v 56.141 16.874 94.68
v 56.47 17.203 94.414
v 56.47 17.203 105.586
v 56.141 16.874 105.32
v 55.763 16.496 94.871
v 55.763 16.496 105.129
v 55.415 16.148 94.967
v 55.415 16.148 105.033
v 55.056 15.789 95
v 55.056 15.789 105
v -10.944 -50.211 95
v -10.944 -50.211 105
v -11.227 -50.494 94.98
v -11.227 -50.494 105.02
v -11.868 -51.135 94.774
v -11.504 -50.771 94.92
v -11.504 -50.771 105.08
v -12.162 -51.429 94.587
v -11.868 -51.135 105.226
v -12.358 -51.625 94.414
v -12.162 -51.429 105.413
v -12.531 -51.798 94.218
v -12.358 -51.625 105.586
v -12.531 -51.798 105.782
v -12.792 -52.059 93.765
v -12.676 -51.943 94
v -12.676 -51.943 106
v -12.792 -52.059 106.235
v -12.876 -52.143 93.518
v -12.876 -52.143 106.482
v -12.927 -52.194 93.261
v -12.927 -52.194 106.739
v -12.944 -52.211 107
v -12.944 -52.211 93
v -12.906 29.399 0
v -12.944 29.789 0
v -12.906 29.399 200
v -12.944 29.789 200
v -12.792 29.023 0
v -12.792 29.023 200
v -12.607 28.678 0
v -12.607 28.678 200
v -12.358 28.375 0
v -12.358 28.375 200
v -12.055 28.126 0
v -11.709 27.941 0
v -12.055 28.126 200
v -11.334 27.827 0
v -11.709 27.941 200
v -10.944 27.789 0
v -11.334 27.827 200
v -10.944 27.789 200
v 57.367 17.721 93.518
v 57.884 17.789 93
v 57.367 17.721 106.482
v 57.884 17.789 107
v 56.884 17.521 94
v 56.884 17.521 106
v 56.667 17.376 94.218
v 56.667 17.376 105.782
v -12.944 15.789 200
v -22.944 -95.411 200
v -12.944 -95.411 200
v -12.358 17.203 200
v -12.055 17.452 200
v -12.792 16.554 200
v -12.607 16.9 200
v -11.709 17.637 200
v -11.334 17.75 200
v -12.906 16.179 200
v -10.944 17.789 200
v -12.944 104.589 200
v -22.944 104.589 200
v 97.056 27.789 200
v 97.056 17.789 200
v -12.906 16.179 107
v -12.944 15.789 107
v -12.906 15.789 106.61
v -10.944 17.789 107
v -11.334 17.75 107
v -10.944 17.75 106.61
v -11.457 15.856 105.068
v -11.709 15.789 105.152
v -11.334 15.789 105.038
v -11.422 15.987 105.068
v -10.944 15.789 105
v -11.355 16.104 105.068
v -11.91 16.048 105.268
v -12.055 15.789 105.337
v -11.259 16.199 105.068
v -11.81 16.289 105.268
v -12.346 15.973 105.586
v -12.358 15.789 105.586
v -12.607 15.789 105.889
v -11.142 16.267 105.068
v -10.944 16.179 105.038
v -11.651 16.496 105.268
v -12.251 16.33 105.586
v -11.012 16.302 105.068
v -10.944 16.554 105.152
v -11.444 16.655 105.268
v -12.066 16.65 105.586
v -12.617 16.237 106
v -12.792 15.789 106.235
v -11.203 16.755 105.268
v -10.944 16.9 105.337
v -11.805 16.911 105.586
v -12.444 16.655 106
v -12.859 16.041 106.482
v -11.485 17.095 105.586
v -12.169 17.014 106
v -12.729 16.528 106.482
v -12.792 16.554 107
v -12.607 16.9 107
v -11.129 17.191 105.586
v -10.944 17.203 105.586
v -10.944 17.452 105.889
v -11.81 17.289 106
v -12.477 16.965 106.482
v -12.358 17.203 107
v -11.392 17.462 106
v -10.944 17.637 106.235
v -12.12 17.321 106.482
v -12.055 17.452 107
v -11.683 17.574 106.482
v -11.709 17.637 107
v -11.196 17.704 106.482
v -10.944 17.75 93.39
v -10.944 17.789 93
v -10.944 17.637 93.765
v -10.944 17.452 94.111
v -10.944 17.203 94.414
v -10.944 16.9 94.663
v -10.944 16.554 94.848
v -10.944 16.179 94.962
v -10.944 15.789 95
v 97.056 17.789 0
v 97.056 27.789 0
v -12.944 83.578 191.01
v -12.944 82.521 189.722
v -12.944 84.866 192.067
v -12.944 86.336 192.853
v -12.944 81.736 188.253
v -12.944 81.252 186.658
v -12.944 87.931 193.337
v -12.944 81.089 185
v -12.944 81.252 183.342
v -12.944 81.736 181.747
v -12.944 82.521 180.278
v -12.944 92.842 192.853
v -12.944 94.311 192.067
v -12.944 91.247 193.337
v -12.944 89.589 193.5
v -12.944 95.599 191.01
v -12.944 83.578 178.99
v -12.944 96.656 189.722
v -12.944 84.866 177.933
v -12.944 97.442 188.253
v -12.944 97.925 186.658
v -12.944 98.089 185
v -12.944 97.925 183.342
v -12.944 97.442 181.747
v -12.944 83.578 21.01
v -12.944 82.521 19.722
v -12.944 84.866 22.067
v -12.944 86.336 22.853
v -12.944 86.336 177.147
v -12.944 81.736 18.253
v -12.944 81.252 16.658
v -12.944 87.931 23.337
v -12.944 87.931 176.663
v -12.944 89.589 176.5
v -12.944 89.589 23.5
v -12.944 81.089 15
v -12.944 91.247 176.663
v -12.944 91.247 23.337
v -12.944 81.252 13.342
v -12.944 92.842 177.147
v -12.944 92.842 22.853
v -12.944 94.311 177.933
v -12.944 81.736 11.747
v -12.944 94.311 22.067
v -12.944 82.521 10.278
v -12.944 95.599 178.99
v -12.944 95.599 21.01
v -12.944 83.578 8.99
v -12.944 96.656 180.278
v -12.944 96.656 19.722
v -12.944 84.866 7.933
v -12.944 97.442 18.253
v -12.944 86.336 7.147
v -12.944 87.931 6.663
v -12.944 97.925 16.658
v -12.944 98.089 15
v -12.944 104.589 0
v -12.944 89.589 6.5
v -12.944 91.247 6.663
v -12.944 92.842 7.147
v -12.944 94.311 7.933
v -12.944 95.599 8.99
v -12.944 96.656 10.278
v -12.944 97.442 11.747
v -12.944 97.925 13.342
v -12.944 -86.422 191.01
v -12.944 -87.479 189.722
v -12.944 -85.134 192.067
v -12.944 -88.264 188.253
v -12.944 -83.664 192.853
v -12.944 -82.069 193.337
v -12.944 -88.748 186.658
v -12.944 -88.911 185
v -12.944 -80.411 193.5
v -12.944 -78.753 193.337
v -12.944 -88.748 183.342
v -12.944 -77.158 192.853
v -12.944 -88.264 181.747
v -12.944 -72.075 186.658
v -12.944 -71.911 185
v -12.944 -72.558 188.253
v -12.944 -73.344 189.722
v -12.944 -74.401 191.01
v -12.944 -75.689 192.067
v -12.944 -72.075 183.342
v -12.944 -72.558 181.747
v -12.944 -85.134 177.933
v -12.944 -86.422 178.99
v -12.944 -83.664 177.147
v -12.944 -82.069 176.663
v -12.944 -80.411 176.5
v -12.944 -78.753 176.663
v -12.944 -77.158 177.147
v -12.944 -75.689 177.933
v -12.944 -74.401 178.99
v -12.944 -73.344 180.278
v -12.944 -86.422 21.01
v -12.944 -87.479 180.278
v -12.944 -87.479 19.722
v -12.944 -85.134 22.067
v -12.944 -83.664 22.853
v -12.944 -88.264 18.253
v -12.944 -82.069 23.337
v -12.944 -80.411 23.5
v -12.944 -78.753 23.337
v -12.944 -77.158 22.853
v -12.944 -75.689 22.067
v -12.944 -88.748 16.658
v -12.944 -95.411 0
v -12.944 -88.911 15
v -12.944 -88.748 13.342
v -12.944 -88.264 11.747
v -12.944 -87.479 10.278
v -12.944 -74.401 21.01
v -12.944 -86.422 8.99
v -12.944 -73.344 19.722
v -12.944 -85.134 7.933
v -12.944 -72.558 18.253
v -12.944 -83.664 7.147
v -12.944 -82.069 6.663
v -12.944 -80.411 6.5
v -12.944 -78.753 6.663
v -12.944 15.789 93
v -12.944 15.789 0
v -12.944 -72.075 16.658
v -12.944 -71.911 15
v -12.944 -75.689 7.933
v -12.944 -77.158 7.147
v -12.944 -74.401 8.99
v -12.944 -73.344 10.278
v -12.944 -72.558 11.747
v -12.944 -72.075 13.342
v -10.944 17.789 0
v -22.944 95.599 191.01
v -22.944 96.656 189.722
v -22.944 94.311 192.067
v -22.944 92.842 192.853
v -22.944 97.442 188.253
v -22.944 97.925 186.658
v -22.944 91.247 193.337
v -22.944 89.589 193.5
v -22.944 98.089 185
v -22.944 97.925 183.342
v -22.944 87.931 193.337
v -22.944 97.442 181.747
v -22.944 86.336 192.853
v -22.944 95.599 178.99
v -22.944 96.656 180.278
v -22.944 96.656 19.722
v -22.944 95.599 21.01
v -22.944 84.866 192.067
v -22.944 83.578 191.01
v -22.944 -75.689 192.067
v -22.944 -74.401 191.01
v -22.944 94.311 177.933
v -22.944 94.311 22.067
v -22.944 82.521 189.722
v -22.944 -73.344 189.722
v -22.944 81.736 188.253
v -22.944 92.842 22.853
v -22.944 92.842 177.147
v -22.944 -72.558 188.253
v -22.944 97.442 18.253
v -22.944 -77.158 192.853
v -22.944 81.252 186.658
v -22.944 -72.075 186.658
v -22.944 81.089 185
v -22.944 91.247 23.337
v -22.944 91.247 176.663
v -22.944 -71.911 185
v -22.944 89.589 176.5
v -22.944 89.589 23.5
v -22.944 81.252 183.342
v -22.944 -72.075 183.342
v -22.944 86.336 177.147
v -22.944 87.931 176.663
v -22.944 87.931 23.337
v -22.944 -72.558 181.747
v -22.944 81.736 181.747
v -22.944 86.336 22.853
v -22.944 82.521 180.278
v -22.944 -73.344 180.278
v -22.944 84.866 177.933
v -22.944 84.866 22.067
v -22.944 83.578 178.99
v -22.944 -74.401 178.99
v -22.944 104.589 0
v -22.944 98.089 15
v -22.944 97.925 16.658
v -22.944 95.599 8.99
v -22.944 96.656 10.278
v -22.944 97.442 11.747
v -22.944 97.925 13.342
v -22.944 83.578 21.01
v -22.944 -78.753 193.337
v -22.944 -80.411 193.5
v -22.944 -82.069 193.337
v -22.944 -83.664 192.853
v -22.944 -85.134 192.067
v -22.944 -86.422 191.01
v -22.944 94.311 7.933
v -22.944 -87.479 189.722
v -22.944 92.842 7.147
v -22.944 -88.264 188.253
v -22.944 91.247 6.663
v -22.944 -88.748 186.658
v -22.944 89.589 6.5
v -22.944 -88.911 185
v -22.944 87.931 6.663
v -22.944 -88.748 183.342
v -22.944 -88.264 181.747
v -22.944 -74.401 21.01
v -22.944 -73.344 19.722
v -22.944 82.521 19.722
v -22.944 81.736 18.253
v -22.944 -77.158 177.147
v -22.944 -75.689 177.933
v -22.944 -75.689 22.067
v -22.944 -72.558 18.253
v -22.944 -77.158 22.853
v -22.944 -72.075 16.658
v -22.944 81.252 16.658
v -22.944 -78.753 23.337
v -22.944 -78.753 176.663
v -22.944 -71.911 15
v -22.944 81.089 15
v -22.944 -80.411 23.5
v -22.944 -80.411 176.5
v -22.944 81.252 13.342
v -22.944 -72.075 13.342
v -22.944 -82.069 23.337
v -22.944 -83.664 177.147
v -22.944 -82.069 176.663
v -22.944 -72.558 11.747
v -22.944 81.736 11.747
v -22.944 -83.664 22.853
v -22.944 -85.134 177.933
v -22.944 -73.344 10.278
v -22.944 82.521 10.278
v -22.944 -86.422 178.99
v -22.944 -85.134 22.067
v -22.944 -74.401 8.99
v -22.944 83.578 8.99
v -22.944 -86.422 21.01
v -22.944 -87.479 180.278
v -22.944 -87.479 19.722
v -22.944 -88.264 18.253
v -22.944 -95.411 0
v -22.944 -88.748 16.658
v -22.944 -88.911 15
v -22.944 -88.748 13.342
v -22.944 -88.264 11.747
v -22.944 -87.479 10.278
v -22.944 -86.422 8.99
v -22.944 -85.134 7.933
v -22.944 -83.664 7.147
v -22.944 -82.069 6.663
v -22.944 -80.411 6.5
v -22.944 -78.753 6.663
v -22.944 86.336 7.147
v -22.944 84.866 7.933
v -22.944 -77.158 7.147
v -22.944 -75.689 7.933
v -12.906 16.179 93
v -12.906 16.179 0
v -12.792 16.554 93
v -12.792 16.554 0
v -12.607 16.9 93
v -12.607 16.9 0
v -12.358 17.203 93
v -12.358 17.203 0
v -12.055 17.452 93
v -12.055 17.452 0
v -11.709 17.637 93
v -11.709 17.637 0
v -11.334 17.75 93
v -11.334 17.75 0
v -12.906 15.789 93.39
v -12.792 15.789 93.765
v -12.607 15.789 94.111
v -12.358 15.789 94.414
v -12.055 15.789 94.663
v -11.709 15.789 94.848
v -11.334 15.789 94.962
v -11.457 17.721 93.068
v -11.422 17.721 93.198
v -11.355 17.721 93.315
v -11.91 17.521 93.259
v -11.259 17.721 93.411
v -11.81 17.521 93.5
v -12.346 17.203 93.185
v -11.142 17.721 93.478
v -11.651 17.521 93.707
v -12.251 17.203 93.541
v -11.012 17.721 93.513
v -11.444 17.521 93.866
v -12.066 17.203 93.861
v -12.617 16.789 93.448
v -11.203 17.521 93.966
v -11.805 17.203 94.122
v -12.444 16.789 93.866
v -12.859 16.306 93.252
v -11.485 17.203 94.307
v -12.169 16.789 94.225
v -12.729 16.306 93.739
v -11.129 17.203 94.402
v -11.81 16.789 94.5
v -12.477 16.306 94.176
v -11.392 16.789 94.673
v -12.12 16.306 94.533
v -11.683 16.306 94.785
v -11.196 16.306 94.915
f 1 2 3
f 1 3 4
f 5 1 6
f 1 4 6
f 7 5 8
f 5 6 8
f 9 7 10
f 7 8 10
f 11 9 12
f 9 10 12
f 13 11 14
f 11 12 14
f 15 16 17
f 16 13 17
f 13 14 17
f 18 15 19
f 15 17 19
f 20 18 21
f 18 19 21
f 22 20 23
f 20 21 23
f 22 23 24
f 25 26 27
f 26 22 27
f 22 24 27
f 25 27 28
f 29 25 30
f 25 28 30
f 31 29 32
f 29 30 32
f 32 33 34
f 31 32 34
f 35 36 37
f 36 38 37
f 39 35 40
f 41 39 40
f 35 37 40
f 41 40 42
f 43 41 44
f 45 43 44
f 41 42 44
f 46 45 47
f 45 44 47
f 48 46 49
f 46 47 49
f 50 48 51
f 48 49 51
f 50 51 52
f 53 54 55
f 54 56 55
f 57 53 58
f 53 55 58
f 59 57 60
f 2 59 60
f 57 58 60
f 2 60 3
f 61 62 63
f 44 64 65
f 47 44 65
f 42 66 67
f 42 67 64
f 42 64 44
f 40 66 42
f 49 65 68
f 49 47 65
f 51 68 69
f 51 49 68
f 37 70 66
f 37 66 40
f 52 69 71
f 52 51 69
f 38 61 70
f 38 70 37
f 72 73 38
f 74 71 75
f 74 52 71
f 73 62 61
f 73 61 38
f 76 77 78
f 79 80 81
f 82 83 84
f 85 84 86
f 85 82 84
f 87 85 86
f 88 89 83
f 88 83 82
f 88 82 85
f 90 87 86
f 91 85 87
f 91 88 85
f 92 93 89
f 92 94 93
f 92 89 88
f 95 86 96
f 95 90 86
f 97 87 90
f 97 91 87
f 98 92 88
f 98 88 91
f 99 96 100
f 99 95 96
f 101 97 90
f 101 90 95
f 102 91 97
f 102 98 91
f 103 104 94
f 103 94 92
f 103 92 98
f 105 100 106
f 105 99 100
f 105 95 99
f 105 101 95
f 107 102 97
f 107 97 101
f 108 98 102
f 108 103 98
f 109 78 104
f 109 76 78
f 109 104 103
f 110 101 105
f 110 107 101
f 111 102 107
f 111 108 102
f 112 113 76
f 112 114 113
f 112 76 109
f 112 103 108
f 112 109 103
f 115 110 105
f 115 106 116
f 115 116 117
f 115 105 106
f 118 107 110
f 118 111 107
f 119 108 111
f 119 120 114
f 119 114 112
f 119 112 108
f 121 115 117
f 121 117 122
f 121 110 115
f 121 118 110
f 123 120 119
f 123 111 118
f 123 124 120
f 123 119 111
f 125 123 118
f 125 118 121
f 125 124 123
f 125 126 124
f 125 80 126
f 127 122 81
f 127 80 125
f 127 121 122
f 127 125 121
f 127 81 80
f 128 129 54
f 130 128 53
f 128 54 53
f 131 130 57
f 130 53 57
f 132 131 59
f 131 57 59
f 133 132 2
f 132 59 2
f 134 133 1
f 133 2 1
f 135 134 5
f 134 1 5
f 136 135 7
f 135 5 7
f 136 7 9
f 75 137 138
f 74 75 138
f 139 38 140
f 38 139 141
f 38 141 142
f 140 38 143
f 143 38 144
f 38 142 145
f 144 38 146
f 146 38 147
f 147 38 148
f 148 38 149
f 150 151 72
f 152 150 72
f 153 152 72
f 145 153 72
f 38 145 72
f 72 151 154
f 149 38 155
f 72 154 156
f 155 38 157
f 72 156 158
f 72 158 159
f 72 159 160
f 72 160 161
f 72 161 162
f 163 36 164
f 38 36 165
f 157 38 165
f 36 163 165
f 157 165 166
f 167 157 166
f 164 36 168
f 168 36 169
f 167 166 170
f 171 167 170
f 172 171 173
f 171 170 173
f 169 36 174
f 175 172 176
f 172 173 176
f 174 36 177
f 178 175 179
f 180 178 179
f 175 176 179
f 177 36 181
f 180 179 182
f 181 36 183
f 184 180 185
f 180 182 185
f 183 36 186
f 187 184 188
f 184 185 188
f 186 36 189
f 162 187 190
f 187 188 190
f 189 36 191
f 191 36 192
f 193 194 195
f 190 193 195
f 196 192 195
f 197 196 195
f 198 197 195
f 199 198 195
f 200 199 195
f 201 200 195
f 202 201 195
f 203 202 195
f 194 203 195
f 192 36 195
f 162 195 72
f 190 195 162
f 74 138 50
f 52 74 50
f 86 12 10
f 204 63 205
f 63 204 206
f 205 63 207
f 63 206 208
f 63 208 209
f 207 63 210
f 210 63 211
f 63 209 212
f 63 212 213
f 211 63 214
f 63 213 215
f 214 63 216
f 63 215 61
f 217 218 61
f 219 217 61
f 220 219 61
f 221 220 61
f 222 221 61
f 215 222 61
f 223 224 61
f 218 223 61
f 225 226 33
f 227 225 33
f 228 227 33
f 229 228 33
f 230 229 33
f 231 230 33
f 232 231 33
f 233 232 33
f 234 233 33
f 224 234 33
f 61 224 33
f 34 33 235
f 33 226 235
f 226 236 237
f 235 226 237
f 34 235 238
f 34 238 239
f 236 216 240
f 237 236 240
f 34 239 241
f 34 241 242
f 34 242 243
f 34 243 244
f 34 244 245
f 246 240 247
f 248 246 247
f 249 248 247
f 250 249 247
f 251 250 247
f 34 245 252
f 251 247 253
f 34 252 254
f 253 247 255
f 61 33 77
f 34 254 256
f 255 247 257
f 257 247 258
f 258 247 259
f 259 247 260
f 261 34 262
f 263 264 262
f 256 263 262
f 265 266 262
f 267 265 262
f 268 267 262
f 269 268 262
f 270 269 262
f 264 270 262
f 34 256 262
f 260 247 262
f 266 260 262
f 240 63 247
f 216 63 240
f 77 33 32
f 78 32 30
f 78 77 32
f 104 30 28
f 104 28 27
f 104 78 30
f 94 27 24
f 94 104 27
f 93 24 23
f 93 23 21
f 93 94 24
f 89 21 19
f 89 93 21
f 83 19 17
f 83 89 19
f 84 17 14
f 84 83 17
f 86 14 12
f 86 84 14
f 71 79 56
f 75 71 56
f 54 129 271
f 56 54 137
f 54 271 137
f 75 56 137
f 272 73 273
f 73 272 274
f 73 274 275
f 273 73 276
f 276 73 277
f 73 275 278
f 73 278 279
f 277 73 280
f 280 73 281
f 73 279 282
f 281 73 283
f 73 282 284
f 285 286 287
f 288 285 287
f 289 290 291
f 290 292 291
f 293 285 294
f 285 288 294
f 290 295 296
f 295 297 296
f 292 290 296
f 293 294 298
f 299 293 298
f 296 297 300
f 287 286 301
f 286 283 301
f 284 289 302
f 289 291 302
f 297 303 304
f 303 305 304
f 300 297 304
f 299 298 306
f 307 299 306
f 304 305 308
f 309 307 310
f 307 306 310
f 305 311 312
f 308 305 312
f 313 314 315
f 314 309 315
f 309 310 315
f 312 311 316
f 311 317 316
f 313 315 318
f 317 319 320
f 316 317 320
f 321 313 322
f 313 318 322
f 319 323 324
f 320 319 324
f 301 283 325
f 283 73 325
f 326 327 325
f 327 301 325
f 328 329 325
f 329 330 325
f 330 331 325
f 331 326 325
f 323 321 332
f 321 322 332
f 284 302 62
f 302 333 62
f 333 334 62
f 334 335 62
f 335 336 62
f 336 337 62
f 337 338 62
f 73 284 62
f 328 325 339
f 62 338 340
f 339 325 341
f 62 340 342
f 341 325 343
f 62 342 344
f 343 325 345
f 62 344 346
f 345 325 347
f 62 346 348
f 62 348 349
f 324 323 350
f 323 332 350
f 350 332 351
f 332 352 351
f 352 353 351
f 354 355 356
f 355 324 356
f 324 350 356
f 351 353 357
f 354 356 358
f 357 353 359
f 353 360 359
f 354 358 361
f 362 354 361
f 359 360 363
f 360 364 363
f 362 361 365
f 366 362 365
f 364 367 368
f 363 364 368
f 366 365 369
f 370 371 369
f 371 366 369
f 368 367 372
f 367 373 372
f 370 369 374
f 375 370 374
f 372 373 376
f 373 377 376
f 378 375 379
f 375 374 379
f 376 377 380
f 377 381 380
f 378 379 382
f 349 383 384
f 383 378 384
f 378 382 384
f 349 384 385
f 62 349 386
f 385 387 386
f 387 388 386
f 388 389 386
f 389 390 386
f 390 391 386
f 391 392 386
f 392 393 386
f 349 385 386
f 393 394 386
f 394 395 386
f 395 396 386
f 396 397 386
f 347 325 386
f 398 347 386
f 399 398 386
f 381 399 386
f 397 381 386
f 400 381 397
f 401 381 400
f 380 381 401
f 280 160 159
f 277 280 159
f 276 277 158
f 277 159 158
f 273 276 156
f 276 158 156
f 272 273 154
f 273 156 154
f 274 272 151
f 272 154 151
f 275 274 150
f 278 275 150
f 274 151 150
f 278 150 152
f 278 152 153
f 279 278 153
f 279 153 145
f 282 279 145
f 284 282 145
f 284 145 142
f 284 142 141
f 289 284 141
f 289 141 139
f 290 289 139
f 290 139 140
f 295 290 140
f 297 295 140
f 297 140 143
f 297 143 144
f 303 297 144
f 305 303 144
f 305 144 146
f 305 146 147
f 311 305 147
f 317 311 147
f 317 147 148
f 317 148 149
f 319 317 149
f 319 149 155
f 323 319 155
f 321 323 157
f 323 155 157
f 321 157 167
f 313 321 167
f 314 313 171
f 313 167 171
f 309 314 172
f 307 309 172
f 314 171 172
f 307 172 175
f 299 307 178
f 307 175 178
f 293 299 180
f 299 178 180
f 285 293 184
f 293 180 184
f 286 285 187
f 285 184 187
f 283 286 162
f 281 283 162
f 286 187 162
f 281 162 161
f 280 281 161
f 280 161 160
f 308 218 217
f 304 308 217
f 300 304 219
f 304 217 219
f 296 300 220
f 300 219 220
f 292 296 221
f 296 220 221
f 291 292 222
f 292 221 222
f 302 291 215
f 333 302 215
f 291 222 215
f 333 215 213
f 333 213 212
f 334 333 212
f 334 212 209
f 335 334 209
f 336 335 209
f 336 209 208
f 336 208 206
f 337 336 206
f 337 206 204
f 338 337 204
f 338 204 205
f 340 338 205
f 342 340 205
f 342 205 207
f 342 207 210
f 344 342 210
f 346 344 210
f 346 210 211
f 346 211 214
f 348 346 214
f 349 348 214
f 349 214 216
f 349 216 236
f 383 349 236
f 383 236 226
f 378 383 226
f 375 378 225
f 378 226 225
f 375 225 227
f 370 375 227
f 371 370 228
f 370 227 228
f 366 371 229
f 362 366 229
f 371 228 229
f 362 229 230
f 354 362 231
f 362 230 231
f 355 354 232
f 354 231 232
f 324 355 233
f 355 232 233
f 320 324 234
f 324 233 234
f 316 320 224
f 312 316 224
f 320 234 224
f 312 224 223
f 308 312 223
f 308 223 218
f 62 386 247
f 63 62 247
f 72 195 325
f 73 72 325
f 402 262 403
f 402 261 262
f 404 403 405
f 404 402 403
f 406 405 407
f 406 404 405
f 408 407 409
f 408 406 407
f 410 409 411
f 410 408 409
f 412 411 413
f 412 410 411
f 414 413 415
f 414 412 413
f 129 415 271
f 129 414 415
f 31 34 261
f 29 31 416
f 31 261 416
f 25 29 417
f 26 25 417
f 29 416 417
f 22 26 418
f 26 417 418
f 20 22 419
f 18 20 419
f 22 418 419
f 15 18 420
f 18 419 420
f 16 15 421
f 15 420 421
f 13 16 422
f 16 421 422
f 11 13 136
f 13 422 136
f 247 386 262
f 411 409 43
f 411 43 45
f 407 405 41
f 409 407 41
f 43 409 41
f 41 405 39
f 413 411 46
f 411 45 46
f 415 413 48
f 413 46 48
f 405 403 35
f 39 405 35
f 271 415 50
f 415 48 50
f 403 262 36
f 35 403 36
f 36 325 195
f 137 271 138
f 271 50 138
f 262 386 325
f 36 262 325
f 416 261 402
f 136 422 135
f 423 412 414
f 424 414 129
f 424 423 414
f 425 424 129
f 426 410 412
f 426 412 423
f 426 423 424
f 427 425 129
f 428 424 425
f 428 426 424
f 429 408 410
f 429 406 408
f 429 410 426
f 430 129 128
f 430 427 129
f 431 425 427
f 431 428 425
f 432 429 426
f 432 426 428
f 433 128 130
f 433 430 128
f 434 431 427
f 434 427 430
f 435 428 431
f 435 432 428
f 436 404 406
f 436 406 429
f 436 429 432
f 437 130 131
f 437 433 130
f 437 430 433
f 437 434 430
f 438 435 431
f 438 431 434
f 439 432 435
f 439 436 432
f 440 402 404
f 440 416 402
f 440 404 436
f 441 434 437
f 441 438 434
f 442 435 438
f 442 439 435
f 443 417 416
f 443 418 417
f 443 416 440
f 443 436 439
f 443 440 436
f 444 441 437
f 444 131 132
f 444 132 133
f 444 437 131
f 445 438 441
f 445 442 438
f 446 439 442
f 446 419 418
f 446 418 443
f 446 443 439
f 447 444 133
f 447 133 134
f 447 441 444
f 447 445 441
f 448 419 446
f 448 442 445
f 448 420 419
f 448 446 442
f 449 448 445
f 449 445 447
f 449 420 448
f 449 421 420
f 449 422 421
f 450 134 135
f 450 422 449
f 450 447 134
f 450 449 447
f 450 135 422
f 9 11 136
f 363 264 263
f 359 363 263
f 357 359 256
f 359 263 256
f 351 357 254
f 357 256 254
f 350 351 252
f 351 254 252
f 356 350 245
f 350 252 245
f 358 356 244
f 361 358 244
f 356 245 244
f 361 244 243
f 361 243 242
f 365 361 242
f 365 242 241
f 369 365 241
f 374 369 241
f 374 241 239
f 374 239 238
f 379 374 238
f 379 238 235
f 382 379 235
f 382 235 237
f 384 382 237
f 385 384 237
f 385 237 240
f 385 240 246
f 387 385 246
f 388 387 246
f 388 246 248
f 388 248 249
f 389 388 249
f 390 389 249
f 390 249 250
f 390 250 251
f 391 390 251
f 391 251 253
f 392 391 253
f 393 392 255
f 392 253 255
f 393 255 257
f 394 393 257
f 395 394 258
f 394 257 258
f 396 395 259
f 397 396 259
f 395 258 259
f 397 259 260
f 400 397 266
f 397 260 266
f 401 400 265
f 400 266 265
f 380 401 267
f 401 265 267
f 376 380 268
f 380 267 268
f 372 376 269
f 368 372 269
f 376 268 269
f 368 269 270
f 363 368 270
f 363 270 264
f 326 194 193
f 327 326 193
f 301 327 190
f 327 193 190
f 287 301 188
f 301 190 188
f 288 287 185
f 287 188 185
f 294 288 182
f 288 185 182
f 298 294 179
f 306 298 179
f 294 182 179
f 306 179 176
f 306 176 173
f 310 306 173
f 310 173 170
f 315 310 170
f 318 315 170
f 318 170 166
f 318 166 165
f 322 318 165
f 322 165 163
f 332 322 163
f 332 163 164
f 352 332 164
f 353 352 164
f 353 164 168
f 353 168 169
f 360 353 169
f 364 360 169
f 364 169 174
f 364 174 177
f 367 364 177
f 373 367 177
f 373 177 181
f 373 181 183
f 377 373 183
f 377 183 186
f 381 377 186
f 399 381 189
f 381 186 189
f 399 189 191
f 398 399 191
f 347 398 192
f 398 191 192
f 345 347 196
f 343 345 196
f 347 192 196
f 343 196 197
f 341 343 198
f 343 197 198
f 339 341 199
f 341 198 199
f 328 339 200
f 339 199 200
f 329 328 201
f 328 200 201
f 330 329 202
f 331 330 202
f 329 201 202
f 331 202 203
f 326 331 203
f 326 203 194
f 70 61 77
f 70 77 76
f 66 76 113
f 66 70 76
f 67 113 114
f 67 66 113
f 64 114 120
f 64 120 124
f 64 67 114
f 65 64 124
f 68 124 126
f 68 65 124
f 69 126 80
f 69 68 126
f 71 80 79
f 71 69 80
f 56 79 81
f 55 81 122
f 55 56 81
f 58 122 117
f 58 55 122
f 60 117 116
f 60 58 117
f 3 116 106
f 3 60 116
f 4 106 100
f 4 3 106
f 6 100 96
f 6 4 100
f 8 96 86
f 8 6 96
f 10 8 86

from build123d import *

# Parameters (mm, degrees)
F1_DEPTH = 200
F2_R     = 8.5
F3_DEPTH = 10.001
F4_W     = 70
F4_H     = 10
F5_DEPTH = 70
F7_DEPTH = 10
F8_R     = 2


with BuildPart() as f1:
    # F0 (on Top) → F1 (new body)
    with BuildSketch(Plane.XY):
        Polygon((-12.944079712, 104.5888163149), (-22.944079712, 104.5888163149), (-22.944079712, -95.4111836851), (-12.944079712, -95.4111836851), (-12.944079712, 17.7888163149), (97.055920288, 17.7888163149), (97.055920288, 27.7888163149), (-12.944079712, 27.7888163149), align=None)
    extrude(amount=F1_DEPTH)

    # F2 (on face) → F3 (cut, through all)
    with BuildSketch(Plane.YZ.offset(-12.944079712)):
        with Locations((89.5888163149, 185)):
            Circle(F2_R)
        with Locations((89.5888163149, 15)):
            Circle(F2_R)
        with Locations((-80.4111836851, 15)):
            Circle(F2_R)
        with Locations((-80.4111836851, 185)):
            Circle(F2_R)
    extrude(amount=-F3_DEPTH, mode=Mode.SUBTRACT)

    # F4 (on face) → F5 (join)
    with BuildSketch(Plane.YZ.offset(-12.944079712)):
        with Locations((-17.2111836851, 100)):
            Rectangle(F4_W, F4_H)
    extrude(amount=F5_DEPTH)

    # F6 (on face) → F7 (cut)
    with BuildSketch(Plane.XY.offset(105)):
        Polygon((57.055920288, 17.7888163149), (-12.944079712, -52.2111836851), (57.055920288, -52.2111836851), align=None)
    extrude(amount=-F7_DEPTH, mode=Mode.SUBTRACT)

    # F8
    f8_edges = [f1.edges().sort_by_distance(p)[0] for p in [
        (-12.94408, 17.788816, 152.5),
        (-12.94408, -17.211184, 105),
        (-12.94408, -17.211184, 95),
        (-12.94408, 17.788816, 47.5),
        (-12.94408, 27.788816, 100),
        (57.05592, 17.788816, 100),
        (22.05592, 17.788816, 105),
        (22.05592, 17.788816, 95),
    ]]
    fillet(f8_edges, radius=F8_R)


solid = f1.part
